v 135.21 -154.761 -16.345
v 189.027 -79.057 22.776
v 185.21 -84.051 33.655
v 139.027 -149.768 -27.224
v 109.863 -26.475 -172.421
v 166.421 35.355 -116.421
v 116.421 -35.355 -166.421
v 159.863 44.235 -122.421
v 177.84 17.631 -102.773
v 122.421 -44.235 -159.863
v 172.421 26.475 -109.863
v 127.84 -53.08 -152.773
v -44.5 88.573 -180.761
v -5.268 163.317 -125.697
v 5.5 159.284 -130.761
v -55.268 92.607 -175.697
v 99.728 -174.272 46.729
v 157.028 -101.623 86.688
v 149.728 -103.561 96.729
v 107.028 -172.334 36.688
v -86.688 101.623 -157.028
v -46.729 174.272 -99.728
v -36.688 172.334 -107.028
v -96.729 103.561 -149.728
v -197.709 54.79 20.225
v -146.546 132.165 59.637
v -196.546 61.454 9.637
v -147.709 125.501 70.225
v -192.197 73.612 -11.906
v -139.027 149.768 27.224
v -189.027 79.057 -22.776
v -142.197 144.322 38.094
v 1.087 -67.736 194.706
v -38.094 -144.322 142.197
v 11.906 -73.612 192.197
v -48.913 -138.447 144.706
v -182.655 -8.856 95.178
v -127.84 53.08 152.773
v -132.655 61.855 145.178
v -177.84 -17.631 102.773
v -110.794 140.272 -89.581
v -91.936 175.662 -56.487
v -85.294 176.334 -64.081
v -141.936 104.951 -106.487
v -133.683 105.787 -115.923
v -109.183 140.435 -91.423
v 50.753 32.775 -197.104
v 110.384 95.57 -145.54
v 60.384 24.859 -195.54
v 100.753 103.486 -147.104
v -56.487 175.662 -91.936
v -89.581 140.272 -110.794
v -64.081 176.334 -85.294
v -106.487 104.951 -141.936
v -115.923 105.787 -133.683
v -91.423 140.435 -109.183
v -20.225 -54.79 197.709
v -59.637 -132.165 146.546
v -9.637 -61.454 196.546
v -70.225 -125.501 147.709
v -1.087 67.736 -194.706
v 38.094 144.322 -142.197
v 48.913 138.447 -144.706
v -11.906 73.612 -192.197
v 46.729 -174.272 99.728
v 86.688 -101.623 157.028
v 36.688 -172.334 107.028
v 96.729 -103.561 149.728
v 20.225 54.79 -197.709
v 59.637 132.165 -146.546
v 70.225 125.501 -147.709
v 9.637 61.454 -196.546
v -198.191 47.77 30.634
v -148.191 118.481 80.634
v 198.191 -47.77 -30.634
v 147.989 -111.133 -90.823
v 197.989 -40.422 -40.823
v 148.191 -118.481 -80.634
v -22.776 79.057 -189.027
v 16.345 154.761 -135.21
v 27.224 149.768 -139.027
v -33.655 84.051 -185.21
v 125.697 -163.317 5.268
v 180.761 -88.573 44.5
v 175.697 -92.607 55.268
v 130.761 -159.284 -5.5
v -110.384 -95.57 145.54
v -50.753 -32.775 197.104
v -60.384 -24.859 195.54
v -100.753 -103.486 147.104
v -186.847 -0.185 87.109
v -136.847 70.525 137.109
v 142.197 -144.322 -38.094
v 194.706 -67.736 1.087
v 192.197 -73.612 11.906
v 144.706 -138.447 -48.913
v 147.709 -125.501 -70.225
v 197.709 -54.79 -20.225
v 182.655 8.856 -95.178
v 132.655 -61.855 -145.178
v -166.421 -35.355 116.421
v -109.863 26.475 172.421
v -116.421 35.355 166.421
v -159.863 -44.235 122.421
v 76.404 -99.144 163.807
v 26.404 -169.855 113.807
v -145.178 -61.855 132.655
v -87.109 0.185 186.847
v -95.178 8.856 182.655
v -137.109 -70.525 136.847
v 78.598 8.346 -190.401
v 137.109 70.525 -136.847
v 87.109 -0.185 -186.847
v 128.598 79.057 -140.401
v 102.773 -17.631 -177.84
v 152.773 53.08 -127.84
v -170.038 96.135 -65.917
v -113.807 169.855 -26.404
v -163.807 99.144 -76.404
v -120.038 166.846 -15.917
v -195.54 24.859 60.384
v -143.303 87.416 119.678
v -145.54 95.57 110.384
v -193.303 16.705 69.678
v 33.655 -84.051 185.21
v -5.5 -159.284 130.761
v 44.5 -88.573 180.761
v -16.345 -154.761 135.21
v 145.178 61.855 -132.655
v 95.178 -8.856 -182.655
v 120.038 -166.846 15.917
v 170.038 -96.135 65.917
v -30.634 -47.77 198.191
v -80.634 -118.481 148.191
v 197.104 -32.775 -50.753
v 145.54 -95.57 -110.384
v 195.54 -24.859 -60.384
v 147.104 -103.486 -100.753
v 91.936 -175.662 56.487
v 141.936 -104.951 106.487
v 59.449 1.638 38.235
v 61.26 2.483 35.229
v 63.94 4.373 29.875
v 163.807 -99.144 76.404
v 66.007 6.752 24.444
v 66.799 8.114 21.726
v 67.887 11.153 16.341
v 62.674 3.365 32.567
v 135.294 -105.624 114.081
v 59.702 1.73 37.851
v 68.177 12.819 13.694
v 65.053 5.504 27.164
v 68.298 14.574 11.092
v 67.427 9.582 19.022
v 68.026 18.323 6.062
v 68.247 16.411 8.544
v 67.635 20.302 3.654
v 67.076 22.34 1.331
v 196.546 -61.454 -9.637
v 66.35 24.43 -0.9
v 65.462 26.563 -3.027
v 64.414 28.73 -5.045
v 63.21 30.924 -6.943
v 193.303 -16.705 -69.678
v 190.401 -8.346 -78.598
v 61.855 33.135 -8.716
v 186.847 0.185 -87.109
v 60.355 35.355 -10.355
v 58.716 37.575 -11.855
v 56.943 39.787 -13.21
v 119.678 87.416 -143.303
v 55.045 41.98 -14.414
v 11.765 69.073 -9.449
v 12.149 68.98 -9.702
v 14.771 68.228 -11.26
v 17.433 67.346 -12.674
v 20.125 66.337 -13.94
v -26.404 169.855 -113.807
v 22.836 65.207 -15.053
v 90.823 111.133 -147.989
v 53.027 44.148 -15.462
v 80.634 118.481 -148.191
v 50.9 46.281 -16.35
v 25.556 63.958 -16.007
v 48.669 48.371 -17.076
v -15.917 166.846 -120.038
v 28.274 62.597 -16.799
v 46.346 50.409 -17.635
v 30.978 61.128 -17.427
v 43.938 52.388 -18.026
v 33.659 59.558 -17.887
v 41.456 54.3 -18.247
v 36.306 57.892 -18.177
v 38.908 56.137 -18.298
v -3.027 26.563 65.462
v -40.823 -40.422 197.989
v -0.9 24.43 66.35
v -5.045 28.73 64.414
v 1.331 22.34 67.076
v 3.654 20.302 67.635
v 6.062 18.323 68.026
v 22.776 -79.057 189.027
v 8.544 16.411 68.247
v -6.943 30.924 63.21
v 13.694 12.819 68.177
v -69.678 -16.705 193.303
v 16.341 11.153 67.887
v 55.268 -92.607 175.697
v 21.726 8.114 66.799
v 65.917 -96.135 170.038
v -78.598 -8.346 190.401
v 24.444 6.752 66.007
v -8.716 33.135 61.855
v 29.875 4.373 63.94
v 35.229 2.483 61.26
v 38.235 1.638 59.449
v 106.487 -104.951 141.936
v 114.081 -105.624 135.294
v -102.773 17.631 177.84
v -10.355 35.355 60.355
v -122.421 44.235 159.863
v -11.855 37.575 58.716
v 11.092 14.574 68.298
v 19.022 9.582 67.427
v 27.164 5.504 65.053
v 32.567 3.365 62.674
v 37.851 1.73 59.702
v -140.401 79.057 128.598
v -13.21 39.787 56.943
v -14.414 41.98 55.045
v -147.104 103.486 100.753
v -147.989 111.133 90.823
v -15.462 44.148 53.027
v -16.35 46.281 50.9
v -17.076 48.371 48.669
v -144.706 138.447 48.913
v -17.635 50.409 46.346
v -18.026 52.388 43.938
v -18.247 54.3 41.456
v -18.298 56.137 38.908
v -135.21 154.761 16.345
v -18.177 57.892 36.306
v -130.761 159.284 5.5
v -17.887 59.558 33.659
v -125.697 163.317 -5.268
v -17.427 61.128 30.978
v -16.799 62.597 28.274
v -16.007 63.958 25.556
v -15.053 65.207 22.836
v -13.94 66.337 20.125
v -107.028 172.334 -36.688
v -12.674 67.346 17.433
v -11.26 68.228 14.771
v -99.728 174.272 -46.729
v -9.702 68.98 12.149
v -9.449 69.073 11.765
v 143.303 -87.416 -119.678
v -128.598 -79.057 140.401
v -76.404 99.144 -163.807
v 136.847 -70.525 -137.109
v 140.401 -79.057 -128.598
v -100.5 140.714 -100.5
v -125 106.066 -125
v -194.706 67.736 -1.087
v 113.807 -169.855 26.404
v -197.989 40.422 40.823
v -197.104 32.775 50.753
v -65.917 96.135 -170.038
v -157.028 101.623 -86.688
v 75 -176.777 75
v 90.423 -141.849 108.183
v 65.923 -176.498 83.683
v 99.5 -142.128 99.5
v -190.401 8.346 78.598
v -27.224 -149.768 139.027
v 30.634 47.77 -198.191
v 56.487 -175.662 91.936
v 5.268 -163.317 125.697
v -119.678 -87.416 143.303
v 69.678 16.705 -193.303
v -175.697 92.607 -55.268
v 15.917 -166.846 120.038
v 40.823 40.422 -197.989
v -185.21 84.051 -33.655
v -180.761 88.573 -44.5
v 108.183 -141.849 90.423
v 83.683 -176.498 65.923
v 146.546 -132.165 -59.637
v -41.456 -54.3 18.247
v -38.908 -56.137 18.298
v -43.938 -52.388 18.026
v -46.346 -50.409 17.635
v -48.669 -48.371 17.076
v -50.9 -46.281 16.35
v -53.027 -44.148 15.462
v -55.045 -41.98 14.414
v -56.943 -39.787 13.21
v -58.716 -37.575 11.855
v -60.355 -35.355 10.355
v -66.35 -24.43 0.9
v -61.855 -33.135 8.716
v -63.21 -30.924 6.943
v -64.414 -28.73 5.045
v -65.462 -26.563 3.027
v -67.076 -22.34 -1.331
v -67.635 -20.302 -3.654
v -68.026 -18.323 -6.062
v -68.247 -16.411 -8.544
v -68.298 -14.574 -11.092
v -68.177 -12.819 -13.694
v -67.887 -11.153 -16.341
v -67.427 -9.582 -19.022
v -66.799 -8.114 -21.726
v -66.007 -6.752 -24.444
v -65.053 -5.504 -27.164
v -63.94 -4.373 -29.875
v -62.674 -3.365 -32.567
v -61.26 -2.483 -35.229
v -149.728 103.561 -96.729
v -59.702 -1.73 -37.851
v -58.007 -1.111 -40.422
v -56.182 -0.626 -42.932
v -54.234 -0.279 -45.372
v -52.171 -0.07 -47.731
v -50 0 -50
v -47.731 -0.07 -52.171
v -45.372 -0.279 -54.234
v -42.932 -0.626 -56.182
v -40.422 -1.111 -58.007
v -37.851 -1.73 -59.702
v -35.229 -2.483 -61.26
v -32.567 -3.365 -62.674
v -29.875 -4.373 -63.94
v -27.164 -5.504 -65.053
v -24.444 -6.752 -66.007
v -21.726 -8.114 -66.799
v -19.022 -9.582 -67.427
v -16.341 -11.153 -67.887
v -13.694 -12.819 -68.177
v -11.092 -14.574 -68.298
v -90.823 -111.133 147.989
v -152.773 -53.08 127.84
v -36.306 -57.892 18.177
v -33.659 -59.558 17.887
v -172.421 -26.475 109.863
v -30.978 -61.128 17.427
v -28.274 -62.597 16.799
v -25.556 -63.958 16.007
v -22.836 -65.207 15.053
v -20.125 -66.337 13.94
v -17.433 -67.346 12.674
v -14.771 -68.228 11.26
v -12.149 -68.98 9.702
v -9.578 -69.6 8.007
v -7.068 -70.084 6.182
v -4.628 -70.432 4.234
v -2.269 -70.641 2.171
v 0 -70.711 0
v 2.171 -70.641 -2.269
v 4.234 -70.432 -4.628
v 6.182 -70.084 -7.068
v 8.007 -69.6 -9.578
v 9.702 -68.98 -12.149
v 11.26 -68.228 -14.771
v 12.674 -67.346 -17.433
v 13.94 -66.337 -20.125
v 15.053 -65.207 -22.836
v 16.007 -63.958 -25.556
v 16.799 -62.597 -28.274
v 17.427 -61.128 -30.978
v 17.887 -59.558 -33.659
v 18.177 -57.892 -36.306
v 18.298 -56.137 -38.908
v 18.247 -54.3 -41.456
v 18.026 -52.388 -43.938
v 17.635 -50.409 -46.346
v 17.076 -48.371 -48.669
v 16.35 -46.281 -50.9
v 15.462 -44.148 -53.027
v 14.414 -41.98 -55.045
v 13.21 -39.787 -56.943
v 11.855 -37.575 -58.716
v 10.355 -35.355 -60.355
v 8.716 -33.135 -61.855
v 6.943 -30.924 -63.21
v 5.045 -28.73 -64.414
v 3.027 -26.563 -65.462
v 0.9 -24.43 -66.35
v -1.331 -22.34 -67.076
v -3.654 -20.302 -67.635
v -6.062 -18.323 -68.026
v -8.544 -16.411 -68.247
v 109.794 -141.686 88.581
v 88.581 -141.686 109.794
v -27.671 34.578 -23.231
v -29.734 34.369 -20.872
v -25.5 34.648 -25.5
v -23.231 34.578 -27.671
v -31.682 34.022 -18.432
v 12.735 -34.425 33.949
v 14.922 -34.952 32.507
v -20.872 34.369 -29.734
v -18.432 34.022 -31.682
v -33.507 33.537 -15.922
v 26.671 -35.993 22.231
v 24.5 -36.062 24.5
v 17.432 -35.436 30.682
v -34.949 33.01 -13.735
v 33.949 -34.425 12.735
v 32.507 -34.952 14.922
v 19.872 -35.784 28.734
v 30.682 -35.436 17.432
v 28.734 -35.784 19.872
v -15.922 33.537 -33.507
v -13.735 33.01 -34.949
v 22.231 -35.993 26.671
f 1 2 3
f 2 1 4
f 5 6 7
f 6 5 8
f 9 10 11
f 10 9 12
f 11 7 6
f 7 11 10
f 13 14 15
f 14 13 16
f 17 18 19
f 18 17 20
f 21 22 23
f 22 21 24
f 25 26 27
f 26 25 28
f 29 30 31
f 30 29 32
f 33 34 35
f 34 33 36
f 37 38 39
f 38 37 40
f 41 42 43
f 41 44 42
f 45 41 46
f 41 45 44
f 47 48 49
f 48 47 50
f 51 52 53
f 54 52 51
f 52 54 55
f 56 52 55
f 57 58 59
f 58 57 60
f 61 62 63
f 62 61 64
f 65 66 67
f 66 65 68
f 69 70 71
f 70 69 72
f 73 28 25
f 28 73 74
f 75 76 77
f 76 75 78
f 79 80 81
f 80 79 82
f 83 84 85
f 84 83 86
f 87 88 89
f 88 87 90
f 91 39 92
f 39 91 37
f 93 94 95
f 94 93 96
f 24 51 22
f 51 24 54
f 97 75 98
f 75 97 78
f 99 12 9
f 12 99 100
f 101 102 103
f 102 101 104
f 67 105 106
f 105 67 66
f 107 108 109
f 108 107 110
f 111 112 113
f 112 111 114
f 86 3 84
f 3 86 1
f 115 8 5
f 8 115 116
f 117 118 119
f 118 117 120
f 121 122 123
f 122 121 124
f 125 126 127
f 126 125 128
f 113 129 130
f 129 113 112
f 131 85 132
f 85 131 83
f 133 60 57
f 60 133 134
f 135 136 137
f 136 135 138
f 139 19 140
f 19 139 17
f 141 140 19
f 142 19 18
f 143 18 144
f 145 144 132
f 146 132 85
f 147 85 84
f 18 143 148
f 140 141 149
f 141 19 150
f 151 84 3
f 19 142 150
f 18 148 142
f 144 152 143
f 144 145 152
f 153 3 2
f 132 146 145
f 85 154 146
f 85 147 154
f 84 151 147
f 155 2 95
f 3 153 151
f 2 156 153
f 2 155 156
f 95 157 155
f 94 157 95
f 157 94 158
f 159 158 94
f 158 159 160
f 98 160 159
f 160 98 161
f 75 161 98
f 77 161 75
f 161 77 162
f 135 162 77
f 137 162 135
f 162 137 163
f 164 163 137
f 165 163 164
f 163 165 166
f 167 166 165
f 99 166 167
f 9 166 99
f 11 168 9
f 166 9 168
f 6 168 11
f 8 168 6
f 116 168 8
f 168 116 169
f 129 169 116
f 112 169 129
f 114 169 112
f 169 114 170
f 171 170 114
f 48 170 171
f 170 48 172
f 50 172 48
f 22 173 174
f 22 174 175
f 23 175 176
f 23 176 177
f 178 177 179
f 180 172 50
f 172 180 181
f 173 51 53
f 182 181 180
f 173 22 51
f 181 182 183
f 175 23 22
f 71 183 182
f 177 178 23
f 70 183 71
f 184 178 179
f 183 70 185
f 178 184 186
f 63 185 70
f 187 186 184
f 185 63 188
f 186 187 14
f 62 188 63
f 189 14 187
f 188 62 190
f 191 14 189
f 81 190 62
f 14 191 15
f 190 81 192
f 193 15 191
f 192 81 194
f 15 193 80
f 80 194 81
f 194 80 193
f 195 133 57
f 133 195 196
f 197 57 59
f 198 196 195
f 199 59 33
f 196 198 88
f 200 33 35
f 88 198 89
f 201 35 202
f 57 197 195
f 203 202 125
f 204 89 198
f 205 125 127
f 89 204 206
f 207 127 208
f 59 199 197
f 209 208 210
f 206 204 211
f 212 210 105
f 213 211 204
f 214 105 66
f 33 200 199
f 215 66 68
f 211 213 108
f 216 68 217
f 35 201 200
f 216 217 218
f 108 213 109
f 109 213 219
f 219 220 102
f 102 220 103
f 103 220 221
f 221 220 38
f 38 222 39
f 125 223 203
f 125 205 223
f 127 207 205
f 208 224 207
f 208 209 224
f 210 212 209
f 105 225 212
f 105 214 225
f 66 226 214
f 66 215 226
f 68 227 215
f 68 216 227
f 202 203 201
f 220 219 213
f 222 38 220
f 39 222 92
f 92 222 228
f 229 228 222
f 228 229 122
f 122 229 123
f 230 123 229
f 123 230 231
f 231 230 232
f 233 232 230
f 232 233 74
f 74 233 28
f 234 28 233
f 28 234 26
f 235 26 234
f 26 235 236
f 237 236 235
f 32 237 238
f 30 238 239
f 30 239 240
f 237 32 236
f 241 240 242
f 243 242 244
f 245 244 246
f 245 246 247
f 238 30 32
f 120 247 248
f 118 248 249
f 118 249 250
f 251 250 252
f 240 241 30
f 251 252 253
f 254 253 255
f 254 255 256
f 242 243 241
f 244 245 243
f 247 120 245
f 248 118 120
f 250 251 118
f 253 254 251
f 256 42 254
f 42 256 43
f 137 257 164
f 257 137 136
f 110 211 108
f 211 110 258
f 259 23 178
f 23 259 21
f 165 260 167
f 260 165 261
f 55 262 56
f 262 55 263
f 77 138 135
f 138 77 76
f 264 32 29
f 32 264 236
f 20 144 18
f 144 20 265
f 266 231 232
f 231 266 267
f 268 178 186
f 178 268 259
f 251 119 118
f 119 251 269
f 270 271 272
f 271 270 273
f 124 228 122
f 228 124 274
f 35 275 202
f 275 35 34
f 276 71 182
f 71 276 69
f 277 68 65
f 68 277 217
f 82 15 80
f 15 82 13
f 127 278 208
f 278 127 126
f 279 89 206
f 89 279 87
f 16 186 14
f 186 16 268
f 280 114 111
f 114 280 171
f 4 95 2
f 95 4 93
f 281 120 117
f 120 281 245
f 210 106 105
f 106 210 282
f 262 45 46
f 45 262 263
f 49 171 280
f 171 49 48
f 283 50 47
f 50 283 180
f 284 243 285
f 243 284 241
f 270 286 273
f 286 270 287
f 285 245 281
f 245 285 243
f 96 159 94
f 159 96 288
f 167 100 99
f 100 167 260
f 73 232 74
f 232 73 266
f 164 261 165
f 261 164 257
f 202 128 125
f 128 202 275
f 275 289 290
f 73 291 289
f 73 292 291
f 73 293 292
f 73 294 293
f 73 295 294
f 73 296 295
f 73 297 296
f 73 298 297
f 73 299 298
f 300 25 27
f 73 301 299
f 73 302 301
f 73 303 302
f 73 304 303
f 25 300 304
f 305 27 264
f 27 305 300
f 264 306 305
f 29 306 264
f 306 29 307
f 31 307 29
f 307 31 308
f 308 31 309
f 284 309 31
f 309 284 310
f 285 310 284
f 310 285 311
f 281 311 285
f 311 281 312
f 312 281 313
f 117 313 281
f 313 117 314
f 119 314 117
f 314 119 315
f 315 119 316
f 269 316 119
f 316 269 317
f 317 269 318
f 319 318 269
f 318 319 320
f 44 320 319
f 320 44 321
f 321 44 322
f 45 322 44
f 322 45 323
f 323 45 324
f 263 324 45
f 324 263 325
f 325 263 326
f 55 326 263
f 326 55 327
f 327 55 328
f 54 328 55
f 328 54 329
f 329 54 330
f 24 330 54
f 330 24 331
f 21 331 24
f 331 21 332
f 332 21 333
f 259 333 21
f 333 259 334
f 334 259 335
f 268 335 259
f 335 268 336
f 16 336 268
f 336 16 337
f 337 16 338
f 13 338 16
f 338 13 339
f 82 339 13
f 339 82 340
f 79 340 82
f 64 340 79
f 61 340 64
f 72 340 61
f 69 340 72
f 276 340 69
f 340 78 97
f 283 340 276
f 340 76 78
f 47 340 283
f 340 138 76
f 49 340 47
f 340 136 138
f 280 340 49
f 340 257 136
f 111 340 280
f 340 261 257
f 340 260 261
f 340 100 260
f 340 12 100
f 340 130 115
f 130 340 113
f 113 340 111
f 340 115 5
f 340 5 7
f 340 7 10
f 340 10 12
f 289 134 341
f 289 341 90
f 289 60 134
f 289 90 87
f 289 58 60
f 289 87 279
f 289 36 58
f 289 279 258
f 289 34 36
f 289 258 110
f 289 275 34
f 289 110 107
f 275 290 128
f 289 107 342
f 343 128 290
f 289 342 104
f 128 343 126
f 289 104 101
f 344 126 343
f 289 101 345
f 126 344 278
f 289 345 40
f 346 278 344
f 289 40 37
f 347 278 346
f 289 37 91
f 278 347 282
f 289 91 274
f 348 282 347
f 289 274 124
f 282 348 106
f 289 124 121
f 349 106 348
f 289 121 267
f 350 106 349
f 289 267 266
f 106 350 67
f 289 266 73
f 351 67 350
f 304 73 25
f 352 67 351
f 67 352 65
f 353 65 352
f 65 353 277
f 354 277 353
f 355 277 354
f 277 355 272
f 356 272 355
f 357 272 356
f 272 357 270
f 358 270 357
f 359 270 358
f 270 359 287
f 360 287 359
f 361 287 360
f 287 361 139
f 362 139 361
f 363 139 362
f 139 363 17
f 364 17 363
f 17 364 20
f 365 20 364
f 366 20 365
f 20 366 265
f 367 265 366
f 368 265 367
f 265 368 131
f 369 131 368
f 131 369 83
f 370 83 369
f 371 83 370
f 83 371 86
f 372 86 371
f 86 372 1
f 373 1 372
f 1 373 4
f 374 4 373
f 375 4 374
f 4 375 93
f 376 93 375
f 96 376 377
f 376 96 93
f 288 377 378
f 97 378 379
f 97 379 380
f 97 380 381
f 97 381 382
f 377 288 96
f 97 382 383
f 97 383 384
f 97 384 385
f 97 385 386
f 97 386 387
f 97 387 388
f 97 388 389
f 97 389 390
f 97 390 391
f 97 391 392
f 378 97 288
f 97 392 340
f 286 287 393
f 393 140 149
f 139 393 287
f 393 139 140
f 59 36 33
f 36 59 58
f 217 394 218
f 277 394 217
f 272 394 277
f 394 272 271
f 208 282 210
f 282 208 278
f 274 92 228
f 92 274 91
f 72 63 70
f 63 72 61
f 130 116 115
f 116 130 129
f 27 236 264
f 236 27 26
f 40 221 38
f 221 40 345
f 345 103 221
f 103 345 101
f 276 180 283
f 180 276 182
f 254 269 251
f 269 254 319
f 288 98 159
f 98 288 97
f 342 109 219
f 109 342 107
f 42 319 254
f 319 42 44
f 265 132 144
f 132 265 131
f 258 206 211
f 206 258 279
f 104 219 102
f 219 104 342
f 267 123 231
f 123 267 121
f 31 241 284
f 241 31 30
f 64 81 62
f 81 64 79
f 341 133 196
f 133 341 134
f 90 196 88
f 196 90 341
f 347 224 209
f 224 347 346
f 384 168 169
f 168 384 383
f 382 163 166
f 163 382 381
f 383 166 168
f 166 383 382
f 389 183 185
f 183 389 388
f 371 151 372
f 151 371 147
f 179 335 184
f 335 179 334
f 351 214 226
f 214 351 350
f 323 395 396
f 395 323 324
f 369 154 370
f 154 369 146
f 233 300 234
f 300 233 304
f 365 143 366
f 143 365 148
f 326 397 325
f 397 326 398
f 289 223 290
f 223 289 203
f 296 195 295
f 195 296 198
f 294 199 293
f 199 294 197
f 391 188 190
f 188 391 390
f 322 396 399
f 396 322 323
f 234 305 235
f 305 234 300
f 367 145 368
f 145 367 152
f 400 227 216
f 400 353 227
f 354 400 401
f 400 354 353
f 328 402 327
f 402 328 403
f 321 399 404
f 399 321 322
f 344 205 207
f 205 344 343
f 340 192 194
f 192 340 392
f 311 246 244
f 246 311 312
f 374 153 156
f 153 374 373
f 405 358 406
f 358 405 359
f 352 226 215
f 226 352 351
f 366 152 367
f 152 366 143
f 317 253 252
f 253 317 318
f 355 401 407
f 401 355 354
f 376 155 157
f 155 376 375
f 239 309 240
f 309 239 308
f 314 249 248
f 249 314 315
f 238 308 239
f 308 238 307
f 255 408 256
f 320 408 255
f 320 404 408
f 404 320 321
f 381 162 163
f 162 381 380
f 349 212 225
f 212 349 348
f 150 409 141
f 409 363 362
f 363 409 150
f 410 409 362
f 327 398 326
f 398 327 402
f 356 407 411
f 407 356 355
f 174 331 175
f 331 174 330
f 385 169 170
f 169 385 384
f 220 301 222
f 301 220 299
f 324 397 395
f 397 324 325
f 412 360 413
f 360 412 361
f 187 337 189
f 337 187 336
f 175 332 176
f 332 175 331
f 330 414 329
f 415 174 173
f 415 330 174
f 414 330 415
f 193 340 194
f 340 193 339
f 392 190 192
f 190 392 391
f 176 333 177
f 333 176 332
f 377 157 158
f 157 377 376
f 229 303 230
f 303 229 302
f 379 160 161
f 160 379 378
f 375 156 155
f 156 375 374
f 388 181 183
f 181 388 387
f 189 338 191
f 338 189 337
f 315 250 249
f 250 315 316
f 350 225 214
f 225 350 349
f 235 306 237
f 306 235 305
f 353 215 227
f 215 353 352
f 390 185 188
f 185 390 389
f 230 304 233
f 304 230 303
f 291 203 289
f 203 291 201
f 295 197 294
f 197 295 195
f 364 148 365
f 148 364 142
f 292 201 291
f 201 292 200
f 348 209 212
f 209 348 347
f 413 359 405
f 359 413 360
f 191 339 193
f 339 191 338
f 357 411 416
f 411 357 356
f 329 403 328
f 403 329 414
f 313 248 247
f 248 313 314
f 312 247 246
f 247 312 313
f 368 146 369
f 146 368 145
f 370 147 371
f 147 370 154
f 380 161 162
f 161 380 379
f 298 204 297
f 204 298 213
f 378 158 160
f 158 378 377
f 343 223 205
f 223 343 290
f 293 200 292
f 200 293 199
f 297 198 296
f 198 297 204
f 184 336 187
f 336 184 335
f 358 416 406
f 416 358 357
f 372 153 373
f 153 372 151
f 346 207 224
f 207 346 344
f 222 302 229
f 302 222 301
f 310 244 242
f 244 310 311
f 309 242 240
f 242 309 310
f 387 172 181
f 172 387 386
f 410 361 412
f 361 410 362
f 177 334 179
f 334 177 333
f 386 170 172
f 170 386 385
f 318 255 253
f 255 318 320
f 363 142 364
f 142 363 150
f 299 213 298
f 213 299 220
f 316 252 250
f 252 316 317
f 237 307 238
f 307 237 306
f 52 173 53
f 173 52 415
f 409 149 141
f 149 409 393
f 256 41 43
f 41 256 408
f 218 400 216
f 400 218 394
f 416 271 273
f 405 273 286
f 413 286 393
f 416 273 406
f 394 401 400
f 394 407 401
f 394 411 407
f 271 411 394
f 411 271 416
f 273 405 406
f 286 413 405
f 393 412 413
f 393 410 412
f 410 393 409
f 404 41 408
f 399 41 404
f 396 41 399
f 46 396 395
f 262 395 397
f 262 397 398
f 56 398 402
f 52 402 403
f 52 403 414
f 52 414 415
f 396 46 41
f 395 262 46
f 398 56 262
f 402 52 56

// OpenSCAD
// file: ../../drawing_sheet_sizes.scad
// drawing_sheet_sizes.scad
sheet_sizes = [
    // ISO 216 (A-Series)
    ["A0", [841, 1189]],
    ["A1", [594, 841]],
    ["A2", [420, 594]],
    ["A3", [297, 420]],
    ["A4", [210, 297]],

    // ANSI Standard (U.S.)
    ["ANSI_A", [216, 279]], // 8.5 × 11 inches
    ["ANSI_B", [279, 432]], // 11 × 17 inches
    ["ANSI_C", [432, 559]], // 17 × 22 inches
    ["ANSI_D", [559, 864]], // 22 × 34 inches
    ["ANSI_E", [864, 1118]], // 34 × 44 inches

    // Architectural Sizes (U.S.)
    ["ARCH_A", [229, 305]], // 9 × 12 inches
    ["ARCH_B", [305, 457]], // 12 × 18 inches
    ["ARCH_C", [457, 610]], // 18 × 24 inches
    ["ARCH_D", [610, 914]], // 24 × 36 inches
    ["ARCH_E", [914, 1219]], // 36 × 48 inches

    // ASME Y14.1 (Engineering Drawings)
    ["ENG_A", [216, 279]], // Same as ANSI A
    ["ENG_B", [279, 432]], // Same as ANSI B
    ["ENG_C", [432, 559]], // Same as ANSI C
    ["ENG_D", [559, 864]], // Same as ANSI D
    ["ENG_E", [864, 1118]], // Same as ANSI E

    // JIS B-Series (Japan)
    ["B0", [1030, 1456]],
    ["B1", [728, 1030]],
    ["B2", [515, 728]],
    ["B3", [364, 515]],
    ["B4", [257, 364]],
];
// file: ../../src/dd_titleblock.scad
/**
 * @file dd_titleblock.scad
 * @brief Functions for creating title blocks on drawing sheets.
 * @details This file contains functions for creating title blocks on drawing sheets. The titleblock function creates a
 * title block with lines, descriptions, and details based on the given parameters.
 * @copyright (c) 2021 Don Smiley, (c) 2025 Cameron K. Brooks
 */

/*
 * titleblock(lines, descs, details, color, text_color)
 * Creates a title block for a drawing sheet, including lines, descriptions, and details.
 * Parameters:
 * - lines: Array defining the lines in the title block with format:
 *           [[startx, starty, orientation, length, width], ...]
 *           - orientation: Use DIM_HORZ or DIM_VERT for horizontal/vertical lines.
 *           - width: Factor to scale the line width beyond DIM_LINE_WIDTH.
 * - descs: Array defining descriptive text blocks with format:
 *           [[startx, starty, orientation, text, size], ...]
 *           - size: Factor to scale font size beyond DIM_FONTSCALE.
 * - details: Array defining part-specific details with format:
 *           [[startx, starty, orientation, text, size], ...]
 * - color: Line color.
 * - text_color: Text color.
 * Behavior:
 * - Draws lines and places text (descriptions and details) at specified positions.
 * - Handles horizontal and vertical orientations for text and lines.
 */
module titleblock(lines, descs, details, color = DEF_LINE_COLOR, text_color = DEF_TEXT_COLOR) {
    DIM_FONTSCALE = DIM_LINE_WIDTH * 0.7;

    for (line = lines)
    {
        color(color) translate([line[0] * DIM_LINE_WIDTH, line[1] * DIM_LINE_WIDTH, 0]) if (line[2] == DIM_VERT) {
                // a vertical line runs down from its start point, and line() draws upward
                translate([0, -line[3] * DIM_LINE_WIDTH, 0])
                    line(length=line[3] * DIM_LINE_WIDTH, width=DIM_LINE_WIDTH * line[4], vert=true);
            } else {
                line(length=(line[3] + 1) * DIM_LINE_WIDTH, width=DIM_LINE_WIDTH * line[4]);
            }
    }

    color(text_color) {
        for (line = descs)
        {
            translate([line[0] * DIM_LINE_WIDTH, line[1] * DIM_LINE_WIDTH, 0]) if (line[2] == DIM_VERT) {
                rotate([0, 0, 90])
                    scale([DIM_FONTSCALE * line[4], DIM_FONTSCALE * line[4], DIM_FONTSCALE * line[4]]) text(line[3]);
            } else {
                scale([DIM_FONTSCALE * line[4], DIM_FONTSCALE * line[4], DIM_FONTSCALE * line[4]]) text(line[3]);
            }
        }

        for (line = details)
        {
            translate([line[0] * DIM_LINE_WIDTH, line[1] * DIM_LINE_WIDTH, 0]) if (line[2] == DIM_VERT) {
                rotate([0, 0, 90])
                    scale([DIM_FONTSCALE * line[4], DIM_FONTSCALE * line[4], DIM_FONTSCALE * line[4]]) text(line[3]);
            } else {
                scale([DIM_FONTSCALE * line[4], DIM_FONTSCALE * line[4], DIM_FONTSCALE * line[4]]) text(line[3]);
            }
        }
    }
}
// file: ../../src/dd_sheet.scad
/**
 * @file dd_sheet.scad
 * @brief Functions for drawing sheets from standard sizes and grid patterns.
 * @details This file contains functions for drawing sheets with standard sizes and grid patterns. The draw_sheet
 * function can draw a sheet boundary based on given dimensions or a standard sheet symbol with a grid or dot pattern.
 * @copyright (c) 2025 Cameron K. Brooks, (c) 2021 Don Smiley
 */

include <../drawing_sheet_sizes.scad>;

/*
 * draw_sheet(length, height, sheet_symbol, grid_type, line_width, color)
 * Draws a sheet boundary based on given dimensions or a standard sheet symbol and adds a grid or dot pattern if
 * specified. Parameters:
 * - length: Length of the sheet (overridden if sheet_symbol is provided).
 * - height: Height of the sheet (overridden if sheet_symbol is provided).
 * - sheet_symbol: Standard sheet size identifier (e.g., "A4", "ANSI_B").
 * - grid_type: "None", "Dot", or "Grid" to specify the background pattern.
 * - line_width: Thickness of the sheet boundary lines.
 * - color: Optional parameter to set the frame's color.
 */
module draw_sheet(
    length = undef,
    height = undef,
    sheet_symbol = undef,
    line_width = DIM_LINE_WIDTH * 2,
    line_height = DIM_LINE_HEIGHT,
    grid_type = "None",
    grid_dim = DIM_GRID_SPACING,
    grid_line_width = DIM_LINE_WIDTH,
    color = DEF_LINE_COLOR
) {
    // If a sheet symbol is provided, it overrides length and height using the sheet_sizes array.
    // An assignment inside an if block is local to that block, so the size is resolved here.
    matches = is_undef(sheet_symbol) ? [] : [for (sheet = sheet_sizes) if (sheet[0] == sheet_symbol) sheet[1]];
    sheet_length = len(matches) > 0 ? matches[0][0] : length;
    sheet_height = len(matches) > 0 ? matches[0][1] : height;

    if (!is_undef(sheet_symbol)) {
        echo("Looking for sheet symbol: ", sheet_symbol);

        if (len(matches) > 0) {
            echo("Match found for sheet symbol: ", sheet_symbol, " Dimensions: ", matches[0]);
        } else {
            echo("Warning: Sheet symbol '", sheet_symbol, "' not found.");
        }
    }

    // Proceed only if length and height are defined
    if (!is_undef(sheet_length) && !is_undef(sheet_height)) {
        // Draw the grid or dots before drawing the frame to ensure it's in the background
        draw_frame(sheet_length, sheet_height, line_width, line_height, color);
        translate([0, 0, -DIM_LINE_WIDTH])
            draw_grid(sheet_length, sheet_height, grid_type, grid_dim, grid_line_width, line_height, "lightgray");
    } else {
        echo("Warning: Invalid dimensions. Frame not drawn.");
    }
}

module draw_frame(length, height, line_width = DIM_LINE_WIDTH, line_height = DIM_LINE_HEIGHT, color = DEF_LINE_COLOR) {
    /*
     * draw_frame(length, height, line_width, color)
     * Draws the rectangular frame of a sheet with specified dimensions and line width.
     * Parameters:
     * - length: Length of the sheet frame.
     * - height: Height of the sheet frame.
     * - line_width: Thickness of the frame lines.
     * - color: Optional parameter to set the frame's color.
     * Behavior:
     * - Creates a rectangular frame with horizontal and vertical lines.
     */
    color(color) {
        // Bottom horizontal line
        line(length=length, width=line_width, height=line_height);

        // Top horizontal line
        translate([0, height, 0]) line(length=length, width=line_width, height=line_height);

        // Left vertical line
        translate([line_width / 2, line_width / 2, 0])
            line(length=height - line_width, width=line_width, height=line_height, vert=true);

        // Right vertical line
        translate([length - line_width / 2, line_width / 2, 0])
            line(length=height - line_width, width=line_width, height=line_height, vert=true);
    }
}

module draw_grid(
    length,
    height,
    type = "None",
    grid_spacing = DIM_GRID_SPACING,
    line_width = DIM_LINE_WIDTH / 2,
    line_height = DIM_LINE_HEIGHT,
    color = "lightgray"
) {
    /*
     * draw_grid(length, height, type, grid_spacing, line_width, color)
     * Adds a grid or dot pattern to the sheet.
     * Parameters:
     * - length: Length of the sheet.
     * - height: Height of the sheet.
     * - type: "None", "Dot", or "Grid" to specify the background pattern.
     * - grid_spacing: Distance between grid lines or dots.
     * - line_width: Thickness of grid lines (ignored for dots).
     * - color: Color of the grid lines or dots.
     */

    if (type == "Grid") {
        color(color) {
            // Draw vertical grid lines
            for (x = [0:grid_spacing:length])
            {
                translate([x, 0, 0]) line(length=height, width=line_width, height=line_height, vert=true);
            }

            // Draw horizontal grid lines
            for (y = [0:grid_spacing:height])
            {
                translate([0, y, 0]) line(
                        length=length, width=line_width, height=line_height,
                        left_arrow=false, right_arrow=false
                    );
            }
        }
    } else if (type == "Dot") {
        color(color) {
            // Define dot size
            dot_size = line_width; // You can adjust the dot size as needed

            for (x = [0:grid_spacing:length])
            {
                for (y = [0:grid_spacing:height])
                {
                    translate([x, y, 0]) sphere(r=dot_size, $fn=12);
                }
            }
        }
    } else {
        echo("No grid or dot pattern selected.");
    }
}
// file: examplePart_DS.scad
partHeight = 100;
partRadius = 200;
holeRadius = 50;
slotWidth = 30;
slotDepth = 50;

module mypart(
    height = partHeight,
    radius = partRadius,
    holeRadius = holeRadius,
    slotWidth = slotWidth,
    slotDepth = slotDepth
) {

    difference() {
        rotate([90, 0, 0]) cylinder(h=height, r=radius, center=true, $fn=100);
        rotate([90, 0, 0]) cylinder(h=height + 1, r=holeRadius, center=true, $fn=100);

        translate([0, holeRadius / 2, 0]) cube([slotWidth, slotDepth + 2, radius * 2 + 1], center=true);
    }
}
// file: ../../dimdraft.scad
// ----- Variables -----
DOC_SCALING_FACTOR = is_undef(SCALING_FACTOR) ? 1 : SCALING_FACTOR;

// Line and text related constants

DIM_LINE_WIDTH_NOMINAL = 0.025; // Nominal line width
DIM_SPACE_NOMINAL = 0.1; // Nominal spacing value for line spacing adjustments
DIM_LINE_HEIGHT_NOMINAL = 0.01; // Nominal height of lines

DIM_LINE_WIDTH =
    is_undef(LINE_WIDTH) ? DIM_LINE_WIDTH_NOMINAL * DOC_SCALING_FACTOR : LINE_WIDTH; // Width of the dimension lines
DIM_LINE_HEIGHT =
    is_undef(HEIGHT) ? DIM_LINE_HEIGHT_NOMINAL * DOC_SCALING_FACTOR : HEIGHT; // Height of the dimension lines
DIM_SPACE =
    is_undef(SPACE) ? DIM_SPACE_NOMINAL * DOC_SCALING_FACTOR : SPACE; // Spacing value for line spacing adjustments

DEF_LINE_COLOR = is_undef(LINE_COLOR) ? "black" : LINE_COLOR; // Default line color
DEF_TEXT_COLOR = is_undef(TEXT_COLOR) ? "black" : TEXT_COLOR; // Default text color

// ----- Dependent Constants -----
// Hole center constant
DIM_HOLE_CENTER = DIM_LINE_WIDTH * 6; // Size of the cross within a circle
// Text is drawn at OpenSCAD's default size of 10 and scaled by DIM_FONTSCALE.
// Its height is 7 line widths unless TEXT_SIZE is set.
DIM_FONTSCALE = is_undef(TEXT_SIZE) ? DIM_LINE_WIDTH * 0.7 : TEXT_SIZE / 10;
DIM_TEXT_SIZE = DIM_FONTSCALE * 10; // Height of the text

DIM_GRID_SPACING = 50; // Default grid spacing value, standard for most drawings (i.e. ISO, ANSI, etc.)

// ----- Constants -----
// Dimension positioning constants
DIM_CENTER = 0;
DIM_LEFT = 1;
DIM_RIGHT = 2;
DIM_OUTSIDE = 3;

// Orientation constants
DIM_HORZ = 0;
DIM_VERT = 1;

// Corner positioning constants
DIM_UPPER_LEFT = 0;
DIM_UPPER_RIGHT = 1;
DIM_LOWER_LEFT = 2;
DIM_LOWER_RIGHT = 3;

// Offset value for hole length
ZFITE = 0.05; // Added to the hole length to extend past the surface of the cube

include <src/dd_dimlines.scad>;
include <src/dd_sheet.scad>;
include <src/dd_titleblock.scad>;
// file: example_DS_config.scad
DOC_HEIGHT = 250;
SCALING_FACTOR = 100;
// LINE_COLOR = "MidnightBlue";
// TEXT_COLOR = "FireBrick";
// main file
include <example_DS_config.scad>;

include <../../dimdraft.scad>;
include <examplePart_DS.scad>;

module exampleView3_DS() {
    rotate([45, 45, 0]) mypart();
}

exampleView3_DS();
